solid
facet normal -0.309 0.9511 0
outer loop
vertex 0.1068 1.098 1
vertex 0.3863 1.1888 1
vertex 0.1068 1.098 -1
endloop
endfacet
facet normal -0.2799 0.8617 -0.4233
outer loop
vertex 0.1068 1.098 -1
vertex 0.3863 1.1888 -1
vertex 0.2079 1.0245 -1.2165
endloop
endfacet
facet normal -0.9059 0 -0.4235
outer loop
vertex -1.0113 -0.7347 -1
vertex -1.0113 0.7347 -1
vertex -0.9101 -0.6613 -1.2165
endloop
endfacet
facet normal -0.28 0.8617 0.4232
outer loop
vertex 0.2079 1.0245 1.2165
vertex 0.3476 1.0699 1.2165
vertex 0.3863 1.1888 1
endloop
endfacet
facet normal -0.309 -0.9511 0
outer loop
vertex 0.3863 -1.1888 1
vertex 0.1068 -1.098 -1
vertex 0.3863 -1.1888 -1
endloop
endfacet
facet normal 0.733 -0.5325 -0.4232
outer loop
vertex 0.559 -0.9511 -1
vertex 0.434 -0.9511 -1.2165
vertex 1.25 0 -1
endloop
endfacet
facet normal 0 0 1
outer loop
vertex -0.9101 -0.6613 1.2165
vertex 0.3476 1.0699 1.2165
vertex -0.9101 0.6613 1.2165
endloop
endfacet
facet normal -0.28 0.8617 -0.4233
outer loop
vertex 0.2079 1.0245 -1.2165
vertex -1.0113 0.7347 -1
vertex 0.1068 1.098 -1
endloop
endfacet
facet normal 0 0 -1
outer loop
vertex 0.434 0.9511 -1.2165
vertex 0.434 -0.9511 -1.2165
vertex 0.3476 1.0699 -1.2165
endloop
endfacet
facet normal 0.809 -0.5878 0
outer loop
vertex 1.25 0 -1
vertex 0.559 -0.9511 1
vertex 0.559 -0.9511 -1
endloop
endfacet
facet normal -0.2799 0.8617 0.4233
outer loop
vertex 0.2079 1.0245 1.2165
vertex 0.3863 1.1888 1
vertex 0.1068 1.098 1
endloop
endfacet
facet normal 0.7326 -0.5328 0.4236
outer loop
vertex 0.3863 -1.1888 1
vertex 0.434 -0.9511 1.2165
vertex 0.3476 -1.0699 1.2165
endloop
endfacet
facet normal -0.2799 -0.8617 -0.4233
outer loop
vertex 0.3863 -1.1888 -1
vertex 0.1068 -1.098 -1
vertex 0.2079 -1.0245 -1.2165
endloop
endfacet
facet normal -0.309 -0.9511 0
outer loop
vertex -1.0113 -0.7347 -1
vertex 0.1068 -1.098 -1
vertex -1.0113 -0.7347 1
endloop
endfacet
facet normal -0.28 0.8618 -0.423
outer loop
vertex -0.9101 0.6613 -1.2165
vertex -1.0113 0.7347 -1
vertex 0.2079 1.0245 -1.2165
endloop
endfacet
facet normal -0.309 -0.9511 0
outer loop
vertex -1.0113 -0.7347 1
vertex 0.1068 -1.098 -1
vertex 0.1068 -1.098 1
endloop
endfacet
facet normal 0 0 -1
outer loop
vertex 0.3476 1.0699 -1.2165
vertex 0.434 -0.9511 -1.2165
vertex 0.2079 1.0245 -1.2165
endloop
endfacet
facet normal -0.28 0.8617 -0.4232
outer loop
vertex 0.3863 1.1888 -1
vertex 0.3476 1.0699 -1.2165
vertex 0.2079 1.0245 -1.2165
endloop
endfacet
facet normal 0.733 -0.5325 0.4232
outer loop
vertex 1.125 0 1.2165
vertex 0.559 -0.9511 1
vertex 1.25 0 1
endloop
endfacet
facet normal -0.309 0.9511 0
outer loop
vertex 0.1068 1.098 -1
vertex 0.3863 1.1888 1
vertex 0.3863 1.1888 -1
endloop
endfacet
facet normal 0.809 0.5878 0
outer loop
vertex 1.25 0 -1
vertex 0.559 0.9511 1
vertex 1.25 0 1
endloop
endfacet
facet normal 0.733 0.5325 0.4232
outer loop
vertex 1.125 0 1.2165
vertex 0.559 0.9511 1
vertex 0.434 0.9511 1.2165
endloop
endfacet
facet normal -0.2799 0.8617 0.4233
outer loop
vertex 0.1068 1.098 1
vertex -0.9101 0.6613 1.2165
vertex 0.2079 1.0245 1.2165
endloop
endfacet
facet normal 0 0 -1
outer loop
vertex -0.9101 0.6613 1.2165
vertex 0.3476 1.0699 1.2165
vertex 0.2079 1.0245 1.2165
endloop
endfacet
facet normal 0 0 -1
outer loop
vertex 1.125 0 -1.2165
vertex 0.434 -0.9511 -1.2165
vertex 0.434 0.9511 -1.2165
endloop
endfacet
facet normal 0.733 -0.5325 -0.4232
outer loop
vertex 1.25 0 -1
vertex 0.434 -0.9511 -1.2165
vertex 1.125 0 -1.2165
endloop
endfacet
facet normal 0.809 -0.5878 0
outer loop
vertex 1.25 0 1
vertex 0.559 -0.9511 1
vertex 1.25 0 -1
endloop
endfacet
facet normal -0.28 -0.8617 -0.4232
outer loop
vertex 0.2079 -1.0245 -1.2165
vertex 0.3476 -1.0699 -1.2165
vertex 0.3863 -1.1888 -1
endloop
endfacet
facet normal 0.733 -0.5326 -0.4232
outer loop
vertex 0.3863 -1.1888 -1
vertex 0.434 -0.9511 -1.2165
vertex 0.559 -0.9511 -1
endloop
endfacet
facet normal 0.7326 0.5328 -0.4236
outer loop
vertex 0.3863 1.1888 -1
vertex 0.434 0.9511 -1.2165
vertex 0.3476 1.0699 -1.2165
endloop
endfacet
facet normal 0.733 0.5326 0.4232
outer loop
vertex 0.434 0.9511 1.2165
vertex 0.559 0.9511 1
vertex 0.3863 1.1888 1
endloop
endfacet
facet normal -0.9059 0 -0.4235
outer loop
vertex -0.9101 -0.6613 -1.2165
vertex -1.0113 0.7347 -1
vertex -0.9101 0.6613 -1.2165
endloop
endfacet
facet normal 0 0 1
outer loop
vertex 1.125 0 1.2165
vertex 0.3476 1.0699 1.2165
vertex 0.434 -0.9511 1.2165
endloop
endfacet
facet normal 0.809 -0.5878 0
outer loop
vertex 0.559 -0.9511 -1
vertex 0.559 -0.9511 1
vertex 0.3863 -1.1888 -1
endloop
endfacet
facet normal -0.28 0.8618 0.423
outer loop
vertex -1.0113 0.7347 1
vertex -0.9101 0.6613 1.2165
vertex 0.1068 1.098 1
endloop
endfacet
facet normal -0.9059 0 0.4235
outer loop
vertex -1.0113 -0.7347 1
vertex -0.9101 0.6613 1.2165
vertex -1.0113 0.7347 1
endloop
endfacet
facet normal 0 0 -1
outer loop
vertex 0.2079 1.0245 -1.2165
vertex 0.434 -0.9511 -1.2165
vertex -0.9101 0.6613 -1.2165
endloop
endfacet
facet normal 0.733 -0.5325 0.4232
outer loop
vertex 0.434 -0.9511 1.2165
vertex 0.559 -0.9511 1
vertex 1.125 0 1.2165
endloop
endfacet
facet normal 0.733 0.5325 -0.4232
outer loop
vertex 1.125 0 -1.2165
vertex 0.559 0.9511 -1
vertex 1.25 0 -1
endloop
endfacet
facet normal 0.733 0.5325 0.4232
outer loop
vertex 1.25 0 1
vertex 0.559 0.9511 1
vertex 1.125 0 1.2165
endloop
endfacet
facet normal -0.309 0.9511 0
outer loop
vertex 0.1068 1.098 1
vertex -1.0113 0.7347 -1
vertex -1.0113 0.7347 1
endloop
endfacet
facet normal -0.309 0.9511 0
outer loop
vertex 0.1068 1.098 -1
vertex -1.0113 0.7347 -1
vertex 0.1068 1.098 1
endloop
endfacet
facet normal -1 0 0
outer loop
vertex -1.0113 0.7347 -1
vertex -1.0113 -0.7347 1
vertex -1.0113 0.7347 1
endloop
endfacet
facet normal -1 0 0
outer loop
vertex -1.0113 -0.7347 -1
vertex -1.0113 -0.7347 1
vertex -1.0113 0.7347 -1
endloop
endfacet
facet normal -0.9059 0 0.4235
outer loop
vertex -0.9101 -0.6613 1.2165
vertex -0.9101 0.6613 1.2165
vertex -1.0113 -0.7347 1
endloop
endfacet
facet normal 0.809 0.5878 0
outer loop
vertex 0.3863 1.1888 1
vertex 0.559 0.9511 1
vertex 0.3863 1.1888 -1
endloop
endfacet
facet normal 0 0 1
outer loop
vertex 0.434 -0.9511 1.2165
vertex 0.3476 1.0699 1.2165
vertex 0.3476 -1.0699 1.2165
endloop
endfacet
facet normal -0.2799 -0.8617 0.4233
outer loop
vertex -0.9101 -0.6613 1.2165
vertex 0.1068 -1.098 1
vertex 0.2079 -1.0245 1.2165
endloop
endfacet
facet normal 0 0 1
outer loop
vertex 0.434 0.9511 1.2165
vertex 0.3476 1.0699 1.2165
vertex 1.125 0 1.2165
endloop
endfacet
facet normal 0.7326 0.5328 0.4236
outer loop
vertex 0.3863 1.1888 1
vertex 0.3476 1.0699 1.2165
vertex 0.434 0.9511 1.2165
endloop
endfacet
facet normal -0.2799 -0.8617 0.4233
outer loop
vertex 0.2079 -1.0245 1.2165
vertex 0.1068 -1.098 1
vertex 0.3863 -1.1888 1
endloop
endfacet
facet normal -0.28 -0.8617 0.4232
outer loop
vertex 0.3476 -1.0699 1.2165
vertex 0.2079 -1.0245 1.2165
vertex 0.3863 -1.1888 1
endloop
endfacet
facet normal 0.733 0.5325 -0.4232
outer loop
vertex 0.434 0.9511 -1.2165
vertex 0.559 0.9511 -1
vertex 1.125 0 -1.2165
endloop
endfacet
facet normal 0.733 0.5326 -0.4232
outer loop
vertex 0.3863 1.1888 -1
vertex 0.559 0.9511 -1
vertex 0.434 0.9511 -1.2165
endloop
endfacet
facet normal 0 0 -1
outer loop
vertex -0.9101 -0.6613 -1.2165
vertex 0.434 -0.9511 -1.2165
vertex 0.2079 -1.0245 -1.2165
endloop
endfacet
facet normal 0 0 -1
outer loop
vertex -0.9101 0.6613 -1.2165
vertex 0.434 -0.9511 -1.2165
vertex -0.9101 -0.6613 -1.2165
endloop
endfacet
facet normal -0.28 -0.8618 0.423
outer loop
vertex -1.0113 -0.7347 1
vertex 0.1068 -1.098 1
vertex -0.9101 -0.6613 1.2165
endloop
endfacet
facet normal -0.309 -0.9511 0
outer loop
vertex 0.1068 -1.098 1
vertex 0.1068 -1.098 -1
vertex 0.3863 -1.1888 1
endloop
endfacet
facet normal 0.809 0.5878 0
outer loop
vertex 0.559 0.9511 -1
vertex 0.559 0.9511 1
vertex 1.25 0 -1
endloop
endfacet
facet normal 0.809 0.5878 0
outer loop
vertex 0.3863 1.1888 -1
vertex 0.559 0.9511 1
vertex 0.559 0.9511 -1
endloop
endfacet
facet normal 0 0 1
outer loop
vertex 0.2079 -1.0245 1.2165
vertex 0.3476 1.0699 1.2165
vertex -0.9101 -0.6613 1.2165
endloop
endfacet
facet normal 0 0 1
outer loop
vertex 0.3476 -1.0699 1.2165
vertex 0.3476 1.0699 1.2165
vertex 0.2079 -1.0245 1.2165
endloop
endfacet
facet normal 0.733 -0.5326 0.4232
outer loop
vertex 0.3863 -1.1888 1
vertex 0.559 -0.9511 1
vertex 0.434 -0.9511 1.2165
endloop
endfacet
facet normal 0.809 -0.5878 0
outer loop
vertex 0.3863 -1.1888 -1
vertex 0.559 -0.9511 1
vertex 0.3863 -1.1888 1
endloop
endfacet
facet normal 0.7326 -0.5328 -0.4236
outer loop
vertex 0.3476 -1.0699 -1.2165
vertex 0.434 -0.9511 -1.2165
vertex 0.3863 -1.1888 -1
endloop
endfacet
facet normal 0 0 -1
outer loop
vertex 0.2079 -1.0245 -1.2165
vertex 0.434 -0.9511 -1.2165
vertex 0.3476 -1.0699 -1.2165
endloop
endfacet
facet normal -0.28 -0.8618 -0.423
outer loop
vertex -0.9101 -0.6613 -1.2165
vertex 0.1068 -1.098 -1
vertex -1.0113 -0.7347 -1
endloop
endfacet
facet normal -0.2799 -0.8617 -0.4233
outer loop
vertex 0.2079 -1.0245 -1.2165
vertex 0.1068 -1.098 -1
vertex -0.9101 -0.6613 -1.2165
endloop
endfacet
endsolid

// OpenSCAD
// Refused: the offset is built for boxes, so a cylinder has no rounded form yet.
minkowski() {
  cylinder(r = 1, h = 2, center = true);
  sphere(0.25);
}
